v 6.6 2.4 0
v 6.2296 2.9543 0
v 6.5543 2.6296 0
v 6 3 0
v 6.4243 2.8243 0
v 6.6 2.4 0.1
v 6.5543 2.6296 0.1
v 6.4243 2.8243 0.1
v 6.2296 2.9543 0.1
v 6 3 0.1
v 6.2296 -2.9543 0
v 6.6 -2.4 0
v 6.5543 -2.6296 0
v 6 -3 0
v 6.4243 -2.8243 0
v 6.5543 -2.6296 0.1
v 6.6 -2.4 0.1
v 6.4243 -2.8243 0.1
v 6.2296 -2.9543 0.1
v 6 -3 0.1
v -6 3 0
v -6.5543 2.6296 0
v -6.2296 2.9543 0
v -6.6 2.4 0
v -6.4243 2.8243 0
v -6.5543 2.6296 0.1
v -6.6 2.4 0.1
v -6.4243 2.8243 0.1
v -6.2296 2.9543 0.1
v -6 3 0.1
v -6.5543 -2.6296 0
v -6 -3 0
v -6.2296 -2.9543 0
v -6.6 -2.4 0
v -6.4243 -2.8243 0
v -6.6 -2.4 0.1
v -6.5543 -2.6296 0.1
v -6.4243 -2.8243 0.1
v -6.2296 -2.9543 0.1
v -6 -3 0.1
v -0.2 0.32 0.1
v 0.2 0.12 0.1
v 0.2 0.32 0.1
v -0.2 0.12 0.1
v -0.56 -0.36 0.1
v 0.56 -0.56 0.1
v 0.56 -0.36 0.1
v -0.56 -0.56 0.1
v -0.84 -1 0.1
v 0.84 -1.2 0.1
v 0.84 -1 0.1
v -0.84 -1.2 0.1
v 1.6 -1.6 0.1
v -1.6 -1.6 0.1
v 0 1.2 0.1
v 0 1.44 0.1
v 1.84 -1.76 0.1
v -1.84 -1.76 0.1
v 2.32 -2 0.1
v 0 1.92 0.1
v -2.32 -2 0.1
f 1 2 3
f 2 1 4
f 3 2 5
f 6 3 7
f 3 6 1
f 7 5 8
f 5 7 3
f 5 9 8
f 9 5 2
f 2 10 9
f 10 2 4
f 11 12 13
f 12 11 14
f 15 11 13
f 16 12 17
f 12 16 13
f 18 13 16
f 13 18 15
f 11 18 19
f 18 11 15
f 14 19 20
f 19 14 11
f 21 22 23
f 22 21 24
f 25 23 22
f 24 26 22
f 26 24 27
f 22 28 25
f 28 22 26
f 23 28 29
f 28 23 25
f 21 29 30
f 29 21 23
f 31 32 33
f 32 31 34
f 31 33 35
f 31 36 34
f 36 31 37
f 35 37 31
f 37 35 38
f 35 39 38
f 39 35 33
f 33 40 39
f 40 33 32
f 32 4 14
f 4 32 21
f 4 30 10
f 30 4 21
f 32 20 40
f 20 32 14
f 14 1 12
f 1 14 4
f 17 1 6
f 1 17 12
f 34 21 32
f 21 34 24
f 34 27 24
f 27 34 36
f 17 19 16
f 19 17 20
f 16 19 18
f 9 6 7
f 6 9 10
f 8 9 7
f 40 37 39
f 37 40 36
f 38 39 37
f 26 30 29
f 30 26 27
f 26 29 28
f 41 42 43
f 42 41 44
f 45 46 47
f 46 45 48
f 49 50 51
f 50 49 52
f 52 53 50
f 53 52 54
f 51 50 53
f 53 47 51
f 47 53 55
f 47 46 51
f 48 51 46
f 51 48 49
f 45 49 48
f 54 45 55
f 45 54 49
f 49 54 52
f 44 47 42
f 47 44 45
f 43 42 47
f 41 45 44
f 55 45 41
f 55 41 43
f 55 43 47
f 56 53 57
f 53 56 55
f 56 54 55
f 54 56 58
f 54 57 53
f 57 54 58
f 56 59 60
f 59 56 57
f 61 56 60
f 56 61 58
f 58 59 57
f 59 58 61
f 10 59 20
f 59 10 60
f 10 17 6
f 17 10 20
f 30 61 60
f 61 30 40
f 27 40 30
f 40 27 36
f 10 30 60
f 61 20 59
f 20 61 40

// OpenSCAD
// file: ../p/box3u12.scad
use <../lib.scad>
function ldraw_lib__box3u12() = [
// 0 Box with 3 Parallel Faces without Any Edges
// 0 Name: box3u12.dat
// 0 Author: J.C. Tchang [tchang]
// 0 !LDRAW_ORG Primitive UPDATE 2014-02
// 0 !LICENSE Licensed under CC BY 2.0 and CC BY 4.0 : see CAreadme.txt
// 
// 0 BFC CERTIFY CCW
  [0,"BFC","CERTIFY"],
  [0,"BFC","CCW"],
// 
// 0 !HISTORY 2014-12-23 [PTadmin] Official Update 2014-02
// 
// 
// 4 16 -1 1 1 1 1 1 1 1 -1 -1 1 -1
  [4,16,-1,1,1,1,1,1,1,1,-1,-1,1,-1],
// 4 16 -1 1 1 -1 0 1 1 0 1 1 1 1
  [4,16,-1,1,1,-1,0,1,1,0,1,1,1,1],
// 4 16 1 1 -1 1 0 -1 -1 0 -1 -1 1 -1
  [4,16,1,1,-1,1,0,-1,-1,0,-1,-1,1,-1],
];
module ldraw_lib__box3u12(step=0, col=false, unit=2/5, alt=false, line=0.2, solid=!$preview)
    makepoly(ldraw_lib__box3u12(), step=step, col=col, unit=unit, alt=alt, line=line, solid=solid);
ldraw_lib__box3u12(line=0.2);
// file: ../p/1-4cyli.scad
use <../lib.scad>
function ldraw_lib__1_4cyli() = [
// 0 Cylinder 0.25
// 0 Name: 1-4cyli.dat
// 0 Author: James Jessiman
// 0 !LDRAW_ORG Primitive UPDATE 2012-01
// 0 !LICENSE Licensed under CC BY 2.0 and CC BY 4.0 : see CAreadme.txt
// 
// 0 BFC CERTIFY CCW
  [0,"BFC","CERTIFY"],
  [0,"BFC","CCW"],
// 
// 0 !HISTORY 2002-03-23 [sbliss] Added BFC statement.
// 0 !HISTORY 2002-04-25 [PTadmin] Official Update 2002-02
// 0 !HISTORY 2007-06-22 [PTadmin] Header formatted for Contributor Agreement
// 0 !HISTORY 2008-07-01 [PTadmin] Official Update 2008-01
// 0 !HISTORY 2012-02-16 [Philo] Changed to CCW
// 0 !HISTORY 2012-03-30 [PTadmin] Official Update 2012-01
// 
// 
// 4 16 1 1 0 0.9239 1 0.3827 0.9239 0 0.3827 1 0 0
  [4,16,1,1,0,0.9239,1,0.3827,0.9239,0,0.3827,1,0,0],
// 5 24 1 0 0 1 1 0 0.9239 0 0.3827 1 0 -1
  [5,24,1,0,0,1,1,0,0.9239,0,0.3827,1,0,-1],
// 4 16 0.9239 1 0.3827 0.7071 1 0.7071 0.7071 0 0.7071 0.9239 0 0.3827
  [4,16,0.9239,1,0.3827,0.7071,1,0.7071,0.7071,0,0.7071,0.9239,0,0.3827],
// 5 24 0.9239 0 0.3827 0.9239 1 0.3827 0.7071 0 0.7071 1 0 0
  [5,24,0.9239,0,0.3827,0.9239,1,0.3827,0.7071,0,0.7071,1,0,0],
// 4 16 0.7071 1 0.7071 0.3827 1 0.9239 0.3827 0 0.9239 0.7071 0 0.7071
  [4,16,0.7071,1,0.7071,0.3827,1,0.9239,0.3827,0,0.9239,0.7071,0,0.7071],
// 5 24 0.7071 0 0.7071 0.7071 1 0.7071 0.3827 0 0.9239 0.9239 0 0.3827
  [5,24,0.7071,0,0.7071,0.7071,1,0.7071,0.3827,0,0.9239,0.9239,0,0.3827],
// 4 16 0.3827 1 0.9239 0 1 1 0 0 1 0.3827 0 0.9239
  [4,16,0.3827,1,0.9239,0,1,1,0,0,1,0.3827,0,0.9239],
// 5 24 0.3827 0 0.9239 0.3827 1 0.9239 0 0 1 0.7071 0 0.7071
  [5,24,0.3827,0,0.9239,0.3827,1,0.9239,0,0,1,0.7071,0,0.7071],
// 5 24 0 0 1 0 1 1 0.3827 0 0.9239 -1 0 1
  [5,24,0,0,1,0,1,1,0.3827,0,0.9239,-1,0,1],
];
module ldraw_lib__1_4cyli(step=0, col=false, unit=2/5, alt=false, line=0.2, solid=!$preview)
    makepoly(ldraw_lib__1_4cyli(), step=step, col=col, unit=unit, alt=alt, line=line, solid=solid);
ldraw_lib__1_4cyli(line=0.2);
// file: ../p/1-4chrd.scad
use <../lib.scad>
function ldraw_lib__1_4chrd() = [
// 0 Chord 0.25
// 0 Name: 1-4chrd.dat
// 0 Author: Tony Hafner [hafhead]
// 0 !LDRAW_ORG Primitive UPDATE 2012-02
// 0 !LICENSE Licensed under CC BY 2.0 and CC BY 4.0 : see CAreadme.txt
// 
// 0 BFC CERTIFY CCW
  [0,"BFC","CERTIFY"],
  [0,"BFC","CCW"],
// 
// 0 !HISTORY 2004-04-22 [PTadmin] Official Update 2004-02
// 0 !HISTORY 2007-10-09 [PTadmin] Header formatted for Contributor Agreement
// 0 !HISTORY 2008-07-01 [PTadmin] Official Update 2008-01
// 0 !HISTORY 2012-08-02 [MMR1988] Re-creation with PrimGen2 and Rectifier
// 0 !HISTORY 2012-08-09 [PTadmin] Official Update 2012-02
// 
// 
// 4 16 0.9239 0 0.3827 0.3827 0 0.9239 0 0 1 1 0 0
  [4,16,0.9239,0,0.3827,0.3827,0,0.9239,0,0,1,1,0,0],
// 3 16 0.7071 0 0.7071 0.3827 0 0.9239 0.9239 0 0.3827
  [3,16,0.7071,0,0.7071,0.3827,0,0.9239,0.9239,0,0.3827],
];
module ldraw_lib__1_4chrd(step=0, col=false, unit=2/5, alt=false, line=0.2, solid=!$preview)
    makepoly(ldraw_lib__1_4chrd(), step=step, col=col, unit=unit, alt=alt, line=line, solid=solid);
ldraw_lib__1_4chrd(line=0.2);
// main file
use <../lib.scad>
use <../p/1-4chrd.scad>
use <../p/1-4cyli.scad>
use <../p/box3u12.scad>
function ldraw_lib__6074343p() = [
// 0 Sticker  0.8 x  1.7 with Red Triangle
// 0 Name: 6074343p.dat
// 0 Author: Christophe Mitillo [Christophe_Mitillo]
// 0 !LDRAW_ORG Part UPDATE 2015-02
// 0 !LICENSE Licensed under CC BY 2.0 and CC BY 4.0 : see CAreadme.txt
// 
// 0 BFC CERTIFY CCW
  [0,"BFC","CERTIFY"],
  [0,"BFC","CCW"],
// 
// 0 !KEYWORDS Set 70816, Spaceship
// 
// 0 !HISTORY 2015-11-11 [MagFors] changed origin, used primitives
// 0 !HISTORY 2015-12-30 [PTadmin] Official Update 2015-02
// 
// 
// 1 16 15 0 6 1.5 0 0 0 -1 0 0 0 1.5 1-4chrd.dat
  [1,16,15,0,6,1.5,0,0,0,-1,0,0,0,1.5, ldraw_lib__1_4chrd()],
// 1 16 15 -0.25 6 1.5 0 0 0 0.25 0 0 0 1.5 1-4cyli.dat
  [1,16,15,-0.25,6,1.5,0,0,0,0.25,0,0,0,1.5, ldraw_lib__1_4cyli()],
// 1 16 15 0 -6 1.5 0 0 0 -1 0 0 0 -1.5 1-4chrd.dat
  [1,16,15,0,-6,1.5,0,0,0,-1,0,0,0,-1.5, ldraw_lib__1_4chrd()],
// 1 16 15 -0.25 -6 1.5 0 0 0 0.25 0 0 0 -1.5 1-4cyli.dat
  [1,16,15,-0.25,-6,1.5,0,0,0,0.25,0,0,0,-1.5, ldraw_lib__1_4cyli()],
// 1 16 -15 0 6 -1.5 0 0 0 -1 0 0 0 1.5 1-4chrd.dat
  [1,16,-15,0,6,-1.5,0,0,0,-1,0,0,0,1.5, ldraw_lib__1_4chrd()],
// 1 16 -15 -0.25 6 -1.5 0 0 0 0.25 0 0 0 1.5 1-4cyli.dat
  [1,16,-15,-0.25,6,-1.5,0,0,0,0.25,0,0,0,1.5, ldraw_lib__1_4cyli()],
// 1 16 -15 0 -6 -1.5 0 0 0 -1 0 0 0 -1.5 1-4chrd.dat
  [1,16,-15,0,-6,-1.5,0,0,0,-1,0,0,0,-1.5, ldraw_lib__1_4chrd()],
// 1 16 -15 -0.25 -6 -1.5 0 0 0 0.25 0 0 0 -1.5 1-4cyli.dat
  [1,16,-15,-0.25,-6,-1.5,0,0,0,0.25,0,0,0,-1.5, ldraw_lib__1_4cyli()],
// 1 16 0 -0.25 0 15 0 0 0 0.25 0 0 0 7.5 box3u12.dat
  [1,16,0,-0.25,0,15,0,0,0,0.25,0,0,0,7.5, ldraw_lib__box3u12()],
// 4 16 15 0 7.5 16.5 0 6 16.5 0 -6 15 0 -7.5
  [4,16,15,0,7.5,16.5,0,6,16.5,0,-6,15,0,-7.5],
// 4 16 16.5 -0.25 6 16.5 -0.25 -6 16.5 0 -6 16.5 0 6
  [4,16,16.5,-0.25,6,16.5,-0.25,-6,16.5,0,-6,16.5,0,6],
// 4 16 -15 0 -7.5 -16.5 0 -6 -16.5 0 6 -15 0 7.5
  [4,16,-15,0,-7.5,-16.5,0,-6,-16.5,0,6,-15,0,7.5],
// 4 16 -16.5 -0.25 -6 -16.5 -0.25 6 -16.5 0 6 -16.5 0 -6
  [4,16,-16.5,-0.25,-6,-16.5,-0.25,6,-16.5,0,6,-16.5,0,-6],
// 0 // Top
// 1 16 15 -0.25 -6 1.5 0 0 0 1 0 0 0 -1.5 1-4chrd.dat
  [1,16,15,-0.25,-6,1.5,0,0,0,1,0,0,0,-1.5, ldraw_lib__1_4chrd()],
// 1 16 15 -0.25 6 1.5 0 0 0 1 0 0 0 1.5 1-4chrd.dat
  [1,16,15,-0.25,6,1.5,0,0,0,1,0,0,0,1.5, ldraw_lib__1_4chrd()],
// 1 16 -15 -0.25 -6 -1.5 0 0 0 1 0 0 0 -1.5 1-4chrd.dat
  [1,16,-15,-0.25,-6,-1.5,0,0,0,1,0,0,0,-1.5, ldraw_lib__1_4chrd()],
// 1 16 -15 -0.25 6 -1.5 0 0 0 1 0 0 0 1.5 1-4chrd.dat
  [1,16,-15,-0.25,6,-1.5,0,0,0,1,0,0,0,1.5, ldraw_lib__1_4chrd()],
// 4 15 0.5 -0.25 0.8 -0.5 -0.25 0.8 -0.5 -0.25 0.3 0.5 -0.25 0.3
  [4,15,0.5,-0.25,0.8,-0.5,-0.25,0.8,-0.5,-0.25,0.3,0.5,-0.25,0.3],
// 4 15 1.4 -0.25 -0.9 -1.4 -0.25 -0.9 -1.4 -0.25 -1.4 1.4 -0.25 -1.4
  [4,15,1.4,-0.25,-0.9,-1.4,-0.25,-0.9,-1.4,-0.25,-1.4,1.4,-0.25,-1.4],
// 4 15 2.1 -0.25 -2.5 -2.1 -0.25 -2.5 -2.1 -0.25 -3 2.1 -0.25 -3
  [4,15,2.1,-0.25,-2.5,-2.1,-0.25,-2.5,-2.1,-0.25,-3,2.1,-0.25,-3],
// 4 4 -2.1 -0.25 -3 -4 -0.25 -4 4 -0.25 -4 2.1 -0.25 -3
  [4,4,-2.1,-0.25,-3,-4,-0.25,-4,4,-0.25,-4,2.1,-0.25,-3],
// 3 4 2.1 -0.25 -2.5 2.1 -0.25 -3 4 -0.25 -4
  [3,4,2.1,-0.25,-2.5,2.1,-0.25,-3,4,-0.25,-4],
// 4 4 2.1 -0.25 -2.5 4 -0.25 -4 0 -0.25 3 1.4 -0.25 -0.9
  [4,4,2.1,-0.25,-2.5,4,-0.25,-4,0,-0.25,3,1.4,-0.25,-0.9],
// 3 4 1.4 -0.25 -0.9 1.4 -0.25 -1.4 2.1 -0.25 -2.5
  [3,4,1.4,-0.25,-0.9,1.4,-0.25,-1.4,2.1,-0.25,-2.5],
// 4 4 -2.1 -0.25 -2.5 2.1 -0.25 -2.5 1.4 -0.25 -1.4 -1.4 -0.25 -1.4
  [4,4,-2.1,-0.25,-2.5,2.1,-0.25,-2.5,1.4,-0.25,-1.4,-1.4,-0.25,-1.4],
// 3 4 -1.4 -0.25 -0.9 -2.1 -0.25 -2.5 -1.4 -0.25 -1.4
  [3,4,-1.4,-0.25,-0.9,-2.1,-0.25,-2.5,-1.4,-0.25,-1.4],
// 4 4 -2.1 -0.25 -2.5 -1.4 -0.25 -0.9 0 -0.25 3 -4 -0.25 -4
  [4,4,-2.1,-0.25,-2.5,-1.4,-0.25,-0.9,0,-0.25,3,-4,-0.25,-4],
// 3 4 -2.1 -0.25 -2.5 -4 -0.25 -4 -2.1 -0.25 -3
  [3,4,-2.1,-0.25,-2.5,-4,-0.25,-4,-2.1,-0.25,-3],
// 4 4 -0.5 -0.25 0.3 -1.4 -0.25 -0.9 1.4 -0.25 -0.9 0.5 -0.25 0.3
  [4,4,-0.5,-0.25,0.3,-1.4,-0.25,-0.9,1.4,-0.25,-0.9,0.5,-0.25,0.3],
// 3 4 0.5 -0.25 0.8 0.5 -0.25 0.3 1.4 -0.25 -0.9
  [3,4,0.5,-0.25,0.8,0.5,-0.25,0.3,1.4,-0.25,-0.9],
// 3 4 -0.5 -0.25 0.8 -1.4 -0.25 -0.9 -0.5 -0.25 0.3
  [3,4,-0.5,-0.25,0.8,-1.4,-0.25,-0.9,-0.5,-0.25,0.3],
// 3 4 0 -0.25 3 -1.4 -0.25 -0.9 -0.5 -0.25 0.8
  [3,4,0,-0.25,3,-1.4,-0.25,-0.9,-0.5,-0.25,0.8],
// 3 4 0 -0.25 3 -0.5 -0.25 0.8 0.5 -0.25 0.8
  [3,4,0,-0.25,3,-0.5,-0.25,0.8,0.5,-0.25,0.8],
// 3 4 0 -0.25 3 0.5 -0.25 0.8 1.4 -0.25 -0.9
  [3,4,0,-0.25,3,0.5,-0.25,0.8,1.4,-0.25,-0.9],
// 4 15 4 -0.25 -4 4.6 -0.25 -4.4 0 -0.25 3.6 0 -0.25 3
  [4,15,4,-0.25,-4,4.6,-0.25,-4.4,0,-0.25,3.6,0,-0.25,3],
// 4 15 -4 -0.25 -4 0 -0.25 3 0 -0.25 3.6 -4.6 -0.25 -4.4
  [4,15,-4,-0.25,-4,0,-0.25,3,0,-0.25,3.6,-4.6,-0.25,-4.4],
// 4 15 4 -0.25 -4 -4 -0.25 -4 -4.6 -0.25 -4.4 4.6 -0.25 -4.4
  [4,15,4,-0.25,-4,-4,-0.25,-4,-4.6,-0.25,-4.4,4.6,-0.25,-4.4],
// 4 4 4.6 -0.25 -4.4 5.8 -0.25 -5 0 -0.25 4.8 0 -0.25 3.6
  [4,4,4.6,-0.25,-4.4,5.8,-0.25,-5,0,-0.25,4.8,0,-0.25,3.6],
// 4 4 -4.6 -0.25 -4.4 0 -0.25 3.6 0 -0.25 4.8 -5.8 -0.25 -5
  [4,4,-4.6,-0.25,-4.4,0,-0.25,3.6,0,-0.25,4.8,-5.8,-0.25,-5],
// 4 4 4.6 -0.25 -4.4 -4.6 -0.25 -4.4 -5.8 -0.25 -5 5.8 -0.25 -5
  [4,4,4.6,-0.25,-4.4,-4.6,-0.25,-4.4,-5.8,-0.25,-5,5.8,-0.25,-5],
// 4 16 15 -0.25 7.5 0 -0.25 4.8 5.8 -0.25 -5 15 -0.25 -7.5
  [4,16,15,-0.25,7.5,0,-0.25,4.8,5.8,-0.25,-5,15,-0.25,-7.5],
// 4 16 15 -0.25 7.5 15 -0.25 -7.5 16.5 -0.25 -6 16.5 -0.25 6
  [4,16,15,-0.25,7.5,15,-0.25,-7.5,16.5,-0.25,-6,16.5,-0.25,6],
// 4 16 -5.8 -0.25 -5 0 -0.25 4.8 -15 -0.25 7.5 -15 -0.25 -7.5
  [4,16,-5.8,-0.25,-5,0,-0.25,4.8,-15,-0.25,7.5,-15,-0.25,-7.5],
// 4 16 -16.5 -0.25 -6 -15 -0.25 -7.5 -15 -0.25 7.5 -16.5 -0.25 6
  [4,16,-16.5,-0.25,-6,-15,-0.25,-7.5,-15,-0.25,7.5,-16.5,-0.25,6],
// 3 16 15 -0.25 7.5 -15 -0.25 7.5 0 -0.25 4.8
  [3,16,15,-0.25,7.5,-15,-0.25,7.5,0,-0.25,4.8],
// 4 16 5.8 -0.25 -5 -5.8 -0.25 -5 -15 -0.25 -7.5 15 -0.25 -7.5
  [4,16,5.8,-0.25,-5,-5.8,-0.25,-5,-15,-0.25,-7.5,15,-0.25,-7.5],
];
module ldraw_lib__6074343p(step=0, col=false, unit=2/5, alt=false, line=0.2, solid=!$preview)
    makepoly(ldraw_lib__6074343p(), step=step, col=col, unit=unit, alt=alt, line=line, solid=solid);
ldraw_lib__6074343p(line=0.2);
